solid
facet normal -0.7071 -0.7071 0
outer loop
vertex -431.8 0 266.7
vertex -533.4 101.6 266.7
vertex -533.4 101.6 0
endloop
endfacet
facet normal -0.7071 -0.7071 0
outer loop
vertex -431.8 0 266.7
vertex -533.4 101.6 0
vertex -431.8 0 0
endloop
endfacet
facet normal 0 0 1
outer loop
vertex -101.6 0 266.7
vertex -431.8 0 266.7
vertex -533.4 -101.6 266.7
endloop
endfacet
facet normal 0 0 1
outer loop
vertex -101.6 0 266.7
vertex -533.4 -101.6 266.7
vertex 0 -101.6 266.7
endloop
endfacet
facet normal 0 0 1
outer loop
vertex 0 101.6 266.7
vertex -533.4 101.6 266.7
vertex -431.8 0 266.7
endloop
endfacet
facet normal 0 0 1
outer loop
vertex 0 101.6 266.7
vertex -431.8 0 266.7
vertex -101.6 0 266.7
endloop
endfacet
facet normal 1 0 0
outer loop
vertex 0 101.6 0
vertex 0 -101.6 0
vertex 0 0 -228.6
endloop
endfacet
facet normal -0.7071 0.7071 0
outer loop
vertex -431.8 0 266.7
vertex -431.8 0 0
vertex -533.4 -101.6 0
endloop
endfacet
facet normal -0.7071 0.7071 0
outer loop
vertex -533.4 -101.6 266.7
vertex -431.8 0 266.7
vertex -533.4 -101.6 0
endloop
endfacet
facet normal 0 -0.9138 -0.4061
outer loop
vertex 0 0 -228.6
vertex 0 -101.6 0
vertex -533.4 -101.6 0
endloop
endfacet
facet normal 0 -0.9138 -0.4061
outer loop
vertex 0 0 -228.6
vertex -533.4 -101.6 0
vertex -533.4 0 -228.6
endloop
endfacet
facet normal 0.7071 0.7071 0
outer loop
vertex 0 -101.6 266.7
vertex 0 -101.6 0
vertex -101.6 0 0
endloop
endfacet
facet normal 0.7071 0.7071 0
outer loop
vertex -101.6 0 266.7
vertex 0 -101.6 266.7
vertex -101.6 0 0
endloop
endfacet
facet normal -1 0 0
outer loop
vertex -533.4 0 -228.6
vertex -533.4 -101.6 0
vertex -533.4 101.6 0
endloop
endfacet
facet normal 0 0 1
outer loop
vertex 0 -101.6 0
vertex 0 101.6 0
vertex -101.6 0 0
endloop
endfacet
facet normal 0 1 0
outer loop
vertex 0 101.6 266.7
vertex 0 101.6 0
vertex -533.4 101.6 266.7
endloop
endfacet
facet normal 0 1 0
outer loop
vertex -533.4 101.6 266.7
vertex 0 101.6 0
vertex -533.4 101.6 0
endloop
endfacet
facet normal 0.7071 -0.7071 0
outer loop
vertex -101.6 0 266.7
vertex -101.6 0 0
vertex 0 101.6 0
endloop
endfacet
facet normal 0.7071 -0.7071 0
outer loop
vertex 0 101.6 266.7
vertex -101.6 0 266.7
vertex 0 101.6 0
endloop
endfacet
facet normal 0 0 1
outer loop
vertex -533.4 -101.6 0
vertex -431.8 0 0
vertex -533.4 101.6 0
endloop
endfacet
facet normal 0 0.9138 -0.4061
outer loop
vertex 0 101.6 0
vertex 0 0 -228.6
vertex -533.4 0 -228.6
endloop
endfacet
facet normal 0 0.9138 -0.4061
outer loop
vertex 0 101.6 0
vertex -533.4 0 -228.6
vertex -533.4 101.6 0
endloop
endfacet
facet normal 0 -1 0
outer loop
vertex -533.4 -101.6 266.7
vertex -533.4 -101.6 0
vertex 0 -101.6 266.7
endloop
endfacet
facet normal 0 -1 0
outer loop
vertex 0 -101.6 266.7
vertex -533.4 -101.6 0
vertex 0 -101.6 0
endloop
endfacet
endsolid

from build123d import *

# Parameters (mm, degrees)
F1_DEPTH = 266.7
F3_DEPTH = 533.4


with BuildPart() as f1:
    # F0 (on Top) → F1 (new body)
    with BuildSketch(Plane.XY):
        Polygon((0, 101.6), (-533.4, 101.6), (-431.8, 0), (-533.4, -101.6), (0, -101.6), (-101.6, 0), align=None)
    extrude(amount=F1_DEPTH)

    # F2 (on Right) → F3 (join)
    with BuildSketch(Plane.YZ):
        Polygon((0, -228.6), (101.6, 0), (-101.6, 0), align=None)
    extrude(amount=-F3_DEPTH)


solid = f1.part
